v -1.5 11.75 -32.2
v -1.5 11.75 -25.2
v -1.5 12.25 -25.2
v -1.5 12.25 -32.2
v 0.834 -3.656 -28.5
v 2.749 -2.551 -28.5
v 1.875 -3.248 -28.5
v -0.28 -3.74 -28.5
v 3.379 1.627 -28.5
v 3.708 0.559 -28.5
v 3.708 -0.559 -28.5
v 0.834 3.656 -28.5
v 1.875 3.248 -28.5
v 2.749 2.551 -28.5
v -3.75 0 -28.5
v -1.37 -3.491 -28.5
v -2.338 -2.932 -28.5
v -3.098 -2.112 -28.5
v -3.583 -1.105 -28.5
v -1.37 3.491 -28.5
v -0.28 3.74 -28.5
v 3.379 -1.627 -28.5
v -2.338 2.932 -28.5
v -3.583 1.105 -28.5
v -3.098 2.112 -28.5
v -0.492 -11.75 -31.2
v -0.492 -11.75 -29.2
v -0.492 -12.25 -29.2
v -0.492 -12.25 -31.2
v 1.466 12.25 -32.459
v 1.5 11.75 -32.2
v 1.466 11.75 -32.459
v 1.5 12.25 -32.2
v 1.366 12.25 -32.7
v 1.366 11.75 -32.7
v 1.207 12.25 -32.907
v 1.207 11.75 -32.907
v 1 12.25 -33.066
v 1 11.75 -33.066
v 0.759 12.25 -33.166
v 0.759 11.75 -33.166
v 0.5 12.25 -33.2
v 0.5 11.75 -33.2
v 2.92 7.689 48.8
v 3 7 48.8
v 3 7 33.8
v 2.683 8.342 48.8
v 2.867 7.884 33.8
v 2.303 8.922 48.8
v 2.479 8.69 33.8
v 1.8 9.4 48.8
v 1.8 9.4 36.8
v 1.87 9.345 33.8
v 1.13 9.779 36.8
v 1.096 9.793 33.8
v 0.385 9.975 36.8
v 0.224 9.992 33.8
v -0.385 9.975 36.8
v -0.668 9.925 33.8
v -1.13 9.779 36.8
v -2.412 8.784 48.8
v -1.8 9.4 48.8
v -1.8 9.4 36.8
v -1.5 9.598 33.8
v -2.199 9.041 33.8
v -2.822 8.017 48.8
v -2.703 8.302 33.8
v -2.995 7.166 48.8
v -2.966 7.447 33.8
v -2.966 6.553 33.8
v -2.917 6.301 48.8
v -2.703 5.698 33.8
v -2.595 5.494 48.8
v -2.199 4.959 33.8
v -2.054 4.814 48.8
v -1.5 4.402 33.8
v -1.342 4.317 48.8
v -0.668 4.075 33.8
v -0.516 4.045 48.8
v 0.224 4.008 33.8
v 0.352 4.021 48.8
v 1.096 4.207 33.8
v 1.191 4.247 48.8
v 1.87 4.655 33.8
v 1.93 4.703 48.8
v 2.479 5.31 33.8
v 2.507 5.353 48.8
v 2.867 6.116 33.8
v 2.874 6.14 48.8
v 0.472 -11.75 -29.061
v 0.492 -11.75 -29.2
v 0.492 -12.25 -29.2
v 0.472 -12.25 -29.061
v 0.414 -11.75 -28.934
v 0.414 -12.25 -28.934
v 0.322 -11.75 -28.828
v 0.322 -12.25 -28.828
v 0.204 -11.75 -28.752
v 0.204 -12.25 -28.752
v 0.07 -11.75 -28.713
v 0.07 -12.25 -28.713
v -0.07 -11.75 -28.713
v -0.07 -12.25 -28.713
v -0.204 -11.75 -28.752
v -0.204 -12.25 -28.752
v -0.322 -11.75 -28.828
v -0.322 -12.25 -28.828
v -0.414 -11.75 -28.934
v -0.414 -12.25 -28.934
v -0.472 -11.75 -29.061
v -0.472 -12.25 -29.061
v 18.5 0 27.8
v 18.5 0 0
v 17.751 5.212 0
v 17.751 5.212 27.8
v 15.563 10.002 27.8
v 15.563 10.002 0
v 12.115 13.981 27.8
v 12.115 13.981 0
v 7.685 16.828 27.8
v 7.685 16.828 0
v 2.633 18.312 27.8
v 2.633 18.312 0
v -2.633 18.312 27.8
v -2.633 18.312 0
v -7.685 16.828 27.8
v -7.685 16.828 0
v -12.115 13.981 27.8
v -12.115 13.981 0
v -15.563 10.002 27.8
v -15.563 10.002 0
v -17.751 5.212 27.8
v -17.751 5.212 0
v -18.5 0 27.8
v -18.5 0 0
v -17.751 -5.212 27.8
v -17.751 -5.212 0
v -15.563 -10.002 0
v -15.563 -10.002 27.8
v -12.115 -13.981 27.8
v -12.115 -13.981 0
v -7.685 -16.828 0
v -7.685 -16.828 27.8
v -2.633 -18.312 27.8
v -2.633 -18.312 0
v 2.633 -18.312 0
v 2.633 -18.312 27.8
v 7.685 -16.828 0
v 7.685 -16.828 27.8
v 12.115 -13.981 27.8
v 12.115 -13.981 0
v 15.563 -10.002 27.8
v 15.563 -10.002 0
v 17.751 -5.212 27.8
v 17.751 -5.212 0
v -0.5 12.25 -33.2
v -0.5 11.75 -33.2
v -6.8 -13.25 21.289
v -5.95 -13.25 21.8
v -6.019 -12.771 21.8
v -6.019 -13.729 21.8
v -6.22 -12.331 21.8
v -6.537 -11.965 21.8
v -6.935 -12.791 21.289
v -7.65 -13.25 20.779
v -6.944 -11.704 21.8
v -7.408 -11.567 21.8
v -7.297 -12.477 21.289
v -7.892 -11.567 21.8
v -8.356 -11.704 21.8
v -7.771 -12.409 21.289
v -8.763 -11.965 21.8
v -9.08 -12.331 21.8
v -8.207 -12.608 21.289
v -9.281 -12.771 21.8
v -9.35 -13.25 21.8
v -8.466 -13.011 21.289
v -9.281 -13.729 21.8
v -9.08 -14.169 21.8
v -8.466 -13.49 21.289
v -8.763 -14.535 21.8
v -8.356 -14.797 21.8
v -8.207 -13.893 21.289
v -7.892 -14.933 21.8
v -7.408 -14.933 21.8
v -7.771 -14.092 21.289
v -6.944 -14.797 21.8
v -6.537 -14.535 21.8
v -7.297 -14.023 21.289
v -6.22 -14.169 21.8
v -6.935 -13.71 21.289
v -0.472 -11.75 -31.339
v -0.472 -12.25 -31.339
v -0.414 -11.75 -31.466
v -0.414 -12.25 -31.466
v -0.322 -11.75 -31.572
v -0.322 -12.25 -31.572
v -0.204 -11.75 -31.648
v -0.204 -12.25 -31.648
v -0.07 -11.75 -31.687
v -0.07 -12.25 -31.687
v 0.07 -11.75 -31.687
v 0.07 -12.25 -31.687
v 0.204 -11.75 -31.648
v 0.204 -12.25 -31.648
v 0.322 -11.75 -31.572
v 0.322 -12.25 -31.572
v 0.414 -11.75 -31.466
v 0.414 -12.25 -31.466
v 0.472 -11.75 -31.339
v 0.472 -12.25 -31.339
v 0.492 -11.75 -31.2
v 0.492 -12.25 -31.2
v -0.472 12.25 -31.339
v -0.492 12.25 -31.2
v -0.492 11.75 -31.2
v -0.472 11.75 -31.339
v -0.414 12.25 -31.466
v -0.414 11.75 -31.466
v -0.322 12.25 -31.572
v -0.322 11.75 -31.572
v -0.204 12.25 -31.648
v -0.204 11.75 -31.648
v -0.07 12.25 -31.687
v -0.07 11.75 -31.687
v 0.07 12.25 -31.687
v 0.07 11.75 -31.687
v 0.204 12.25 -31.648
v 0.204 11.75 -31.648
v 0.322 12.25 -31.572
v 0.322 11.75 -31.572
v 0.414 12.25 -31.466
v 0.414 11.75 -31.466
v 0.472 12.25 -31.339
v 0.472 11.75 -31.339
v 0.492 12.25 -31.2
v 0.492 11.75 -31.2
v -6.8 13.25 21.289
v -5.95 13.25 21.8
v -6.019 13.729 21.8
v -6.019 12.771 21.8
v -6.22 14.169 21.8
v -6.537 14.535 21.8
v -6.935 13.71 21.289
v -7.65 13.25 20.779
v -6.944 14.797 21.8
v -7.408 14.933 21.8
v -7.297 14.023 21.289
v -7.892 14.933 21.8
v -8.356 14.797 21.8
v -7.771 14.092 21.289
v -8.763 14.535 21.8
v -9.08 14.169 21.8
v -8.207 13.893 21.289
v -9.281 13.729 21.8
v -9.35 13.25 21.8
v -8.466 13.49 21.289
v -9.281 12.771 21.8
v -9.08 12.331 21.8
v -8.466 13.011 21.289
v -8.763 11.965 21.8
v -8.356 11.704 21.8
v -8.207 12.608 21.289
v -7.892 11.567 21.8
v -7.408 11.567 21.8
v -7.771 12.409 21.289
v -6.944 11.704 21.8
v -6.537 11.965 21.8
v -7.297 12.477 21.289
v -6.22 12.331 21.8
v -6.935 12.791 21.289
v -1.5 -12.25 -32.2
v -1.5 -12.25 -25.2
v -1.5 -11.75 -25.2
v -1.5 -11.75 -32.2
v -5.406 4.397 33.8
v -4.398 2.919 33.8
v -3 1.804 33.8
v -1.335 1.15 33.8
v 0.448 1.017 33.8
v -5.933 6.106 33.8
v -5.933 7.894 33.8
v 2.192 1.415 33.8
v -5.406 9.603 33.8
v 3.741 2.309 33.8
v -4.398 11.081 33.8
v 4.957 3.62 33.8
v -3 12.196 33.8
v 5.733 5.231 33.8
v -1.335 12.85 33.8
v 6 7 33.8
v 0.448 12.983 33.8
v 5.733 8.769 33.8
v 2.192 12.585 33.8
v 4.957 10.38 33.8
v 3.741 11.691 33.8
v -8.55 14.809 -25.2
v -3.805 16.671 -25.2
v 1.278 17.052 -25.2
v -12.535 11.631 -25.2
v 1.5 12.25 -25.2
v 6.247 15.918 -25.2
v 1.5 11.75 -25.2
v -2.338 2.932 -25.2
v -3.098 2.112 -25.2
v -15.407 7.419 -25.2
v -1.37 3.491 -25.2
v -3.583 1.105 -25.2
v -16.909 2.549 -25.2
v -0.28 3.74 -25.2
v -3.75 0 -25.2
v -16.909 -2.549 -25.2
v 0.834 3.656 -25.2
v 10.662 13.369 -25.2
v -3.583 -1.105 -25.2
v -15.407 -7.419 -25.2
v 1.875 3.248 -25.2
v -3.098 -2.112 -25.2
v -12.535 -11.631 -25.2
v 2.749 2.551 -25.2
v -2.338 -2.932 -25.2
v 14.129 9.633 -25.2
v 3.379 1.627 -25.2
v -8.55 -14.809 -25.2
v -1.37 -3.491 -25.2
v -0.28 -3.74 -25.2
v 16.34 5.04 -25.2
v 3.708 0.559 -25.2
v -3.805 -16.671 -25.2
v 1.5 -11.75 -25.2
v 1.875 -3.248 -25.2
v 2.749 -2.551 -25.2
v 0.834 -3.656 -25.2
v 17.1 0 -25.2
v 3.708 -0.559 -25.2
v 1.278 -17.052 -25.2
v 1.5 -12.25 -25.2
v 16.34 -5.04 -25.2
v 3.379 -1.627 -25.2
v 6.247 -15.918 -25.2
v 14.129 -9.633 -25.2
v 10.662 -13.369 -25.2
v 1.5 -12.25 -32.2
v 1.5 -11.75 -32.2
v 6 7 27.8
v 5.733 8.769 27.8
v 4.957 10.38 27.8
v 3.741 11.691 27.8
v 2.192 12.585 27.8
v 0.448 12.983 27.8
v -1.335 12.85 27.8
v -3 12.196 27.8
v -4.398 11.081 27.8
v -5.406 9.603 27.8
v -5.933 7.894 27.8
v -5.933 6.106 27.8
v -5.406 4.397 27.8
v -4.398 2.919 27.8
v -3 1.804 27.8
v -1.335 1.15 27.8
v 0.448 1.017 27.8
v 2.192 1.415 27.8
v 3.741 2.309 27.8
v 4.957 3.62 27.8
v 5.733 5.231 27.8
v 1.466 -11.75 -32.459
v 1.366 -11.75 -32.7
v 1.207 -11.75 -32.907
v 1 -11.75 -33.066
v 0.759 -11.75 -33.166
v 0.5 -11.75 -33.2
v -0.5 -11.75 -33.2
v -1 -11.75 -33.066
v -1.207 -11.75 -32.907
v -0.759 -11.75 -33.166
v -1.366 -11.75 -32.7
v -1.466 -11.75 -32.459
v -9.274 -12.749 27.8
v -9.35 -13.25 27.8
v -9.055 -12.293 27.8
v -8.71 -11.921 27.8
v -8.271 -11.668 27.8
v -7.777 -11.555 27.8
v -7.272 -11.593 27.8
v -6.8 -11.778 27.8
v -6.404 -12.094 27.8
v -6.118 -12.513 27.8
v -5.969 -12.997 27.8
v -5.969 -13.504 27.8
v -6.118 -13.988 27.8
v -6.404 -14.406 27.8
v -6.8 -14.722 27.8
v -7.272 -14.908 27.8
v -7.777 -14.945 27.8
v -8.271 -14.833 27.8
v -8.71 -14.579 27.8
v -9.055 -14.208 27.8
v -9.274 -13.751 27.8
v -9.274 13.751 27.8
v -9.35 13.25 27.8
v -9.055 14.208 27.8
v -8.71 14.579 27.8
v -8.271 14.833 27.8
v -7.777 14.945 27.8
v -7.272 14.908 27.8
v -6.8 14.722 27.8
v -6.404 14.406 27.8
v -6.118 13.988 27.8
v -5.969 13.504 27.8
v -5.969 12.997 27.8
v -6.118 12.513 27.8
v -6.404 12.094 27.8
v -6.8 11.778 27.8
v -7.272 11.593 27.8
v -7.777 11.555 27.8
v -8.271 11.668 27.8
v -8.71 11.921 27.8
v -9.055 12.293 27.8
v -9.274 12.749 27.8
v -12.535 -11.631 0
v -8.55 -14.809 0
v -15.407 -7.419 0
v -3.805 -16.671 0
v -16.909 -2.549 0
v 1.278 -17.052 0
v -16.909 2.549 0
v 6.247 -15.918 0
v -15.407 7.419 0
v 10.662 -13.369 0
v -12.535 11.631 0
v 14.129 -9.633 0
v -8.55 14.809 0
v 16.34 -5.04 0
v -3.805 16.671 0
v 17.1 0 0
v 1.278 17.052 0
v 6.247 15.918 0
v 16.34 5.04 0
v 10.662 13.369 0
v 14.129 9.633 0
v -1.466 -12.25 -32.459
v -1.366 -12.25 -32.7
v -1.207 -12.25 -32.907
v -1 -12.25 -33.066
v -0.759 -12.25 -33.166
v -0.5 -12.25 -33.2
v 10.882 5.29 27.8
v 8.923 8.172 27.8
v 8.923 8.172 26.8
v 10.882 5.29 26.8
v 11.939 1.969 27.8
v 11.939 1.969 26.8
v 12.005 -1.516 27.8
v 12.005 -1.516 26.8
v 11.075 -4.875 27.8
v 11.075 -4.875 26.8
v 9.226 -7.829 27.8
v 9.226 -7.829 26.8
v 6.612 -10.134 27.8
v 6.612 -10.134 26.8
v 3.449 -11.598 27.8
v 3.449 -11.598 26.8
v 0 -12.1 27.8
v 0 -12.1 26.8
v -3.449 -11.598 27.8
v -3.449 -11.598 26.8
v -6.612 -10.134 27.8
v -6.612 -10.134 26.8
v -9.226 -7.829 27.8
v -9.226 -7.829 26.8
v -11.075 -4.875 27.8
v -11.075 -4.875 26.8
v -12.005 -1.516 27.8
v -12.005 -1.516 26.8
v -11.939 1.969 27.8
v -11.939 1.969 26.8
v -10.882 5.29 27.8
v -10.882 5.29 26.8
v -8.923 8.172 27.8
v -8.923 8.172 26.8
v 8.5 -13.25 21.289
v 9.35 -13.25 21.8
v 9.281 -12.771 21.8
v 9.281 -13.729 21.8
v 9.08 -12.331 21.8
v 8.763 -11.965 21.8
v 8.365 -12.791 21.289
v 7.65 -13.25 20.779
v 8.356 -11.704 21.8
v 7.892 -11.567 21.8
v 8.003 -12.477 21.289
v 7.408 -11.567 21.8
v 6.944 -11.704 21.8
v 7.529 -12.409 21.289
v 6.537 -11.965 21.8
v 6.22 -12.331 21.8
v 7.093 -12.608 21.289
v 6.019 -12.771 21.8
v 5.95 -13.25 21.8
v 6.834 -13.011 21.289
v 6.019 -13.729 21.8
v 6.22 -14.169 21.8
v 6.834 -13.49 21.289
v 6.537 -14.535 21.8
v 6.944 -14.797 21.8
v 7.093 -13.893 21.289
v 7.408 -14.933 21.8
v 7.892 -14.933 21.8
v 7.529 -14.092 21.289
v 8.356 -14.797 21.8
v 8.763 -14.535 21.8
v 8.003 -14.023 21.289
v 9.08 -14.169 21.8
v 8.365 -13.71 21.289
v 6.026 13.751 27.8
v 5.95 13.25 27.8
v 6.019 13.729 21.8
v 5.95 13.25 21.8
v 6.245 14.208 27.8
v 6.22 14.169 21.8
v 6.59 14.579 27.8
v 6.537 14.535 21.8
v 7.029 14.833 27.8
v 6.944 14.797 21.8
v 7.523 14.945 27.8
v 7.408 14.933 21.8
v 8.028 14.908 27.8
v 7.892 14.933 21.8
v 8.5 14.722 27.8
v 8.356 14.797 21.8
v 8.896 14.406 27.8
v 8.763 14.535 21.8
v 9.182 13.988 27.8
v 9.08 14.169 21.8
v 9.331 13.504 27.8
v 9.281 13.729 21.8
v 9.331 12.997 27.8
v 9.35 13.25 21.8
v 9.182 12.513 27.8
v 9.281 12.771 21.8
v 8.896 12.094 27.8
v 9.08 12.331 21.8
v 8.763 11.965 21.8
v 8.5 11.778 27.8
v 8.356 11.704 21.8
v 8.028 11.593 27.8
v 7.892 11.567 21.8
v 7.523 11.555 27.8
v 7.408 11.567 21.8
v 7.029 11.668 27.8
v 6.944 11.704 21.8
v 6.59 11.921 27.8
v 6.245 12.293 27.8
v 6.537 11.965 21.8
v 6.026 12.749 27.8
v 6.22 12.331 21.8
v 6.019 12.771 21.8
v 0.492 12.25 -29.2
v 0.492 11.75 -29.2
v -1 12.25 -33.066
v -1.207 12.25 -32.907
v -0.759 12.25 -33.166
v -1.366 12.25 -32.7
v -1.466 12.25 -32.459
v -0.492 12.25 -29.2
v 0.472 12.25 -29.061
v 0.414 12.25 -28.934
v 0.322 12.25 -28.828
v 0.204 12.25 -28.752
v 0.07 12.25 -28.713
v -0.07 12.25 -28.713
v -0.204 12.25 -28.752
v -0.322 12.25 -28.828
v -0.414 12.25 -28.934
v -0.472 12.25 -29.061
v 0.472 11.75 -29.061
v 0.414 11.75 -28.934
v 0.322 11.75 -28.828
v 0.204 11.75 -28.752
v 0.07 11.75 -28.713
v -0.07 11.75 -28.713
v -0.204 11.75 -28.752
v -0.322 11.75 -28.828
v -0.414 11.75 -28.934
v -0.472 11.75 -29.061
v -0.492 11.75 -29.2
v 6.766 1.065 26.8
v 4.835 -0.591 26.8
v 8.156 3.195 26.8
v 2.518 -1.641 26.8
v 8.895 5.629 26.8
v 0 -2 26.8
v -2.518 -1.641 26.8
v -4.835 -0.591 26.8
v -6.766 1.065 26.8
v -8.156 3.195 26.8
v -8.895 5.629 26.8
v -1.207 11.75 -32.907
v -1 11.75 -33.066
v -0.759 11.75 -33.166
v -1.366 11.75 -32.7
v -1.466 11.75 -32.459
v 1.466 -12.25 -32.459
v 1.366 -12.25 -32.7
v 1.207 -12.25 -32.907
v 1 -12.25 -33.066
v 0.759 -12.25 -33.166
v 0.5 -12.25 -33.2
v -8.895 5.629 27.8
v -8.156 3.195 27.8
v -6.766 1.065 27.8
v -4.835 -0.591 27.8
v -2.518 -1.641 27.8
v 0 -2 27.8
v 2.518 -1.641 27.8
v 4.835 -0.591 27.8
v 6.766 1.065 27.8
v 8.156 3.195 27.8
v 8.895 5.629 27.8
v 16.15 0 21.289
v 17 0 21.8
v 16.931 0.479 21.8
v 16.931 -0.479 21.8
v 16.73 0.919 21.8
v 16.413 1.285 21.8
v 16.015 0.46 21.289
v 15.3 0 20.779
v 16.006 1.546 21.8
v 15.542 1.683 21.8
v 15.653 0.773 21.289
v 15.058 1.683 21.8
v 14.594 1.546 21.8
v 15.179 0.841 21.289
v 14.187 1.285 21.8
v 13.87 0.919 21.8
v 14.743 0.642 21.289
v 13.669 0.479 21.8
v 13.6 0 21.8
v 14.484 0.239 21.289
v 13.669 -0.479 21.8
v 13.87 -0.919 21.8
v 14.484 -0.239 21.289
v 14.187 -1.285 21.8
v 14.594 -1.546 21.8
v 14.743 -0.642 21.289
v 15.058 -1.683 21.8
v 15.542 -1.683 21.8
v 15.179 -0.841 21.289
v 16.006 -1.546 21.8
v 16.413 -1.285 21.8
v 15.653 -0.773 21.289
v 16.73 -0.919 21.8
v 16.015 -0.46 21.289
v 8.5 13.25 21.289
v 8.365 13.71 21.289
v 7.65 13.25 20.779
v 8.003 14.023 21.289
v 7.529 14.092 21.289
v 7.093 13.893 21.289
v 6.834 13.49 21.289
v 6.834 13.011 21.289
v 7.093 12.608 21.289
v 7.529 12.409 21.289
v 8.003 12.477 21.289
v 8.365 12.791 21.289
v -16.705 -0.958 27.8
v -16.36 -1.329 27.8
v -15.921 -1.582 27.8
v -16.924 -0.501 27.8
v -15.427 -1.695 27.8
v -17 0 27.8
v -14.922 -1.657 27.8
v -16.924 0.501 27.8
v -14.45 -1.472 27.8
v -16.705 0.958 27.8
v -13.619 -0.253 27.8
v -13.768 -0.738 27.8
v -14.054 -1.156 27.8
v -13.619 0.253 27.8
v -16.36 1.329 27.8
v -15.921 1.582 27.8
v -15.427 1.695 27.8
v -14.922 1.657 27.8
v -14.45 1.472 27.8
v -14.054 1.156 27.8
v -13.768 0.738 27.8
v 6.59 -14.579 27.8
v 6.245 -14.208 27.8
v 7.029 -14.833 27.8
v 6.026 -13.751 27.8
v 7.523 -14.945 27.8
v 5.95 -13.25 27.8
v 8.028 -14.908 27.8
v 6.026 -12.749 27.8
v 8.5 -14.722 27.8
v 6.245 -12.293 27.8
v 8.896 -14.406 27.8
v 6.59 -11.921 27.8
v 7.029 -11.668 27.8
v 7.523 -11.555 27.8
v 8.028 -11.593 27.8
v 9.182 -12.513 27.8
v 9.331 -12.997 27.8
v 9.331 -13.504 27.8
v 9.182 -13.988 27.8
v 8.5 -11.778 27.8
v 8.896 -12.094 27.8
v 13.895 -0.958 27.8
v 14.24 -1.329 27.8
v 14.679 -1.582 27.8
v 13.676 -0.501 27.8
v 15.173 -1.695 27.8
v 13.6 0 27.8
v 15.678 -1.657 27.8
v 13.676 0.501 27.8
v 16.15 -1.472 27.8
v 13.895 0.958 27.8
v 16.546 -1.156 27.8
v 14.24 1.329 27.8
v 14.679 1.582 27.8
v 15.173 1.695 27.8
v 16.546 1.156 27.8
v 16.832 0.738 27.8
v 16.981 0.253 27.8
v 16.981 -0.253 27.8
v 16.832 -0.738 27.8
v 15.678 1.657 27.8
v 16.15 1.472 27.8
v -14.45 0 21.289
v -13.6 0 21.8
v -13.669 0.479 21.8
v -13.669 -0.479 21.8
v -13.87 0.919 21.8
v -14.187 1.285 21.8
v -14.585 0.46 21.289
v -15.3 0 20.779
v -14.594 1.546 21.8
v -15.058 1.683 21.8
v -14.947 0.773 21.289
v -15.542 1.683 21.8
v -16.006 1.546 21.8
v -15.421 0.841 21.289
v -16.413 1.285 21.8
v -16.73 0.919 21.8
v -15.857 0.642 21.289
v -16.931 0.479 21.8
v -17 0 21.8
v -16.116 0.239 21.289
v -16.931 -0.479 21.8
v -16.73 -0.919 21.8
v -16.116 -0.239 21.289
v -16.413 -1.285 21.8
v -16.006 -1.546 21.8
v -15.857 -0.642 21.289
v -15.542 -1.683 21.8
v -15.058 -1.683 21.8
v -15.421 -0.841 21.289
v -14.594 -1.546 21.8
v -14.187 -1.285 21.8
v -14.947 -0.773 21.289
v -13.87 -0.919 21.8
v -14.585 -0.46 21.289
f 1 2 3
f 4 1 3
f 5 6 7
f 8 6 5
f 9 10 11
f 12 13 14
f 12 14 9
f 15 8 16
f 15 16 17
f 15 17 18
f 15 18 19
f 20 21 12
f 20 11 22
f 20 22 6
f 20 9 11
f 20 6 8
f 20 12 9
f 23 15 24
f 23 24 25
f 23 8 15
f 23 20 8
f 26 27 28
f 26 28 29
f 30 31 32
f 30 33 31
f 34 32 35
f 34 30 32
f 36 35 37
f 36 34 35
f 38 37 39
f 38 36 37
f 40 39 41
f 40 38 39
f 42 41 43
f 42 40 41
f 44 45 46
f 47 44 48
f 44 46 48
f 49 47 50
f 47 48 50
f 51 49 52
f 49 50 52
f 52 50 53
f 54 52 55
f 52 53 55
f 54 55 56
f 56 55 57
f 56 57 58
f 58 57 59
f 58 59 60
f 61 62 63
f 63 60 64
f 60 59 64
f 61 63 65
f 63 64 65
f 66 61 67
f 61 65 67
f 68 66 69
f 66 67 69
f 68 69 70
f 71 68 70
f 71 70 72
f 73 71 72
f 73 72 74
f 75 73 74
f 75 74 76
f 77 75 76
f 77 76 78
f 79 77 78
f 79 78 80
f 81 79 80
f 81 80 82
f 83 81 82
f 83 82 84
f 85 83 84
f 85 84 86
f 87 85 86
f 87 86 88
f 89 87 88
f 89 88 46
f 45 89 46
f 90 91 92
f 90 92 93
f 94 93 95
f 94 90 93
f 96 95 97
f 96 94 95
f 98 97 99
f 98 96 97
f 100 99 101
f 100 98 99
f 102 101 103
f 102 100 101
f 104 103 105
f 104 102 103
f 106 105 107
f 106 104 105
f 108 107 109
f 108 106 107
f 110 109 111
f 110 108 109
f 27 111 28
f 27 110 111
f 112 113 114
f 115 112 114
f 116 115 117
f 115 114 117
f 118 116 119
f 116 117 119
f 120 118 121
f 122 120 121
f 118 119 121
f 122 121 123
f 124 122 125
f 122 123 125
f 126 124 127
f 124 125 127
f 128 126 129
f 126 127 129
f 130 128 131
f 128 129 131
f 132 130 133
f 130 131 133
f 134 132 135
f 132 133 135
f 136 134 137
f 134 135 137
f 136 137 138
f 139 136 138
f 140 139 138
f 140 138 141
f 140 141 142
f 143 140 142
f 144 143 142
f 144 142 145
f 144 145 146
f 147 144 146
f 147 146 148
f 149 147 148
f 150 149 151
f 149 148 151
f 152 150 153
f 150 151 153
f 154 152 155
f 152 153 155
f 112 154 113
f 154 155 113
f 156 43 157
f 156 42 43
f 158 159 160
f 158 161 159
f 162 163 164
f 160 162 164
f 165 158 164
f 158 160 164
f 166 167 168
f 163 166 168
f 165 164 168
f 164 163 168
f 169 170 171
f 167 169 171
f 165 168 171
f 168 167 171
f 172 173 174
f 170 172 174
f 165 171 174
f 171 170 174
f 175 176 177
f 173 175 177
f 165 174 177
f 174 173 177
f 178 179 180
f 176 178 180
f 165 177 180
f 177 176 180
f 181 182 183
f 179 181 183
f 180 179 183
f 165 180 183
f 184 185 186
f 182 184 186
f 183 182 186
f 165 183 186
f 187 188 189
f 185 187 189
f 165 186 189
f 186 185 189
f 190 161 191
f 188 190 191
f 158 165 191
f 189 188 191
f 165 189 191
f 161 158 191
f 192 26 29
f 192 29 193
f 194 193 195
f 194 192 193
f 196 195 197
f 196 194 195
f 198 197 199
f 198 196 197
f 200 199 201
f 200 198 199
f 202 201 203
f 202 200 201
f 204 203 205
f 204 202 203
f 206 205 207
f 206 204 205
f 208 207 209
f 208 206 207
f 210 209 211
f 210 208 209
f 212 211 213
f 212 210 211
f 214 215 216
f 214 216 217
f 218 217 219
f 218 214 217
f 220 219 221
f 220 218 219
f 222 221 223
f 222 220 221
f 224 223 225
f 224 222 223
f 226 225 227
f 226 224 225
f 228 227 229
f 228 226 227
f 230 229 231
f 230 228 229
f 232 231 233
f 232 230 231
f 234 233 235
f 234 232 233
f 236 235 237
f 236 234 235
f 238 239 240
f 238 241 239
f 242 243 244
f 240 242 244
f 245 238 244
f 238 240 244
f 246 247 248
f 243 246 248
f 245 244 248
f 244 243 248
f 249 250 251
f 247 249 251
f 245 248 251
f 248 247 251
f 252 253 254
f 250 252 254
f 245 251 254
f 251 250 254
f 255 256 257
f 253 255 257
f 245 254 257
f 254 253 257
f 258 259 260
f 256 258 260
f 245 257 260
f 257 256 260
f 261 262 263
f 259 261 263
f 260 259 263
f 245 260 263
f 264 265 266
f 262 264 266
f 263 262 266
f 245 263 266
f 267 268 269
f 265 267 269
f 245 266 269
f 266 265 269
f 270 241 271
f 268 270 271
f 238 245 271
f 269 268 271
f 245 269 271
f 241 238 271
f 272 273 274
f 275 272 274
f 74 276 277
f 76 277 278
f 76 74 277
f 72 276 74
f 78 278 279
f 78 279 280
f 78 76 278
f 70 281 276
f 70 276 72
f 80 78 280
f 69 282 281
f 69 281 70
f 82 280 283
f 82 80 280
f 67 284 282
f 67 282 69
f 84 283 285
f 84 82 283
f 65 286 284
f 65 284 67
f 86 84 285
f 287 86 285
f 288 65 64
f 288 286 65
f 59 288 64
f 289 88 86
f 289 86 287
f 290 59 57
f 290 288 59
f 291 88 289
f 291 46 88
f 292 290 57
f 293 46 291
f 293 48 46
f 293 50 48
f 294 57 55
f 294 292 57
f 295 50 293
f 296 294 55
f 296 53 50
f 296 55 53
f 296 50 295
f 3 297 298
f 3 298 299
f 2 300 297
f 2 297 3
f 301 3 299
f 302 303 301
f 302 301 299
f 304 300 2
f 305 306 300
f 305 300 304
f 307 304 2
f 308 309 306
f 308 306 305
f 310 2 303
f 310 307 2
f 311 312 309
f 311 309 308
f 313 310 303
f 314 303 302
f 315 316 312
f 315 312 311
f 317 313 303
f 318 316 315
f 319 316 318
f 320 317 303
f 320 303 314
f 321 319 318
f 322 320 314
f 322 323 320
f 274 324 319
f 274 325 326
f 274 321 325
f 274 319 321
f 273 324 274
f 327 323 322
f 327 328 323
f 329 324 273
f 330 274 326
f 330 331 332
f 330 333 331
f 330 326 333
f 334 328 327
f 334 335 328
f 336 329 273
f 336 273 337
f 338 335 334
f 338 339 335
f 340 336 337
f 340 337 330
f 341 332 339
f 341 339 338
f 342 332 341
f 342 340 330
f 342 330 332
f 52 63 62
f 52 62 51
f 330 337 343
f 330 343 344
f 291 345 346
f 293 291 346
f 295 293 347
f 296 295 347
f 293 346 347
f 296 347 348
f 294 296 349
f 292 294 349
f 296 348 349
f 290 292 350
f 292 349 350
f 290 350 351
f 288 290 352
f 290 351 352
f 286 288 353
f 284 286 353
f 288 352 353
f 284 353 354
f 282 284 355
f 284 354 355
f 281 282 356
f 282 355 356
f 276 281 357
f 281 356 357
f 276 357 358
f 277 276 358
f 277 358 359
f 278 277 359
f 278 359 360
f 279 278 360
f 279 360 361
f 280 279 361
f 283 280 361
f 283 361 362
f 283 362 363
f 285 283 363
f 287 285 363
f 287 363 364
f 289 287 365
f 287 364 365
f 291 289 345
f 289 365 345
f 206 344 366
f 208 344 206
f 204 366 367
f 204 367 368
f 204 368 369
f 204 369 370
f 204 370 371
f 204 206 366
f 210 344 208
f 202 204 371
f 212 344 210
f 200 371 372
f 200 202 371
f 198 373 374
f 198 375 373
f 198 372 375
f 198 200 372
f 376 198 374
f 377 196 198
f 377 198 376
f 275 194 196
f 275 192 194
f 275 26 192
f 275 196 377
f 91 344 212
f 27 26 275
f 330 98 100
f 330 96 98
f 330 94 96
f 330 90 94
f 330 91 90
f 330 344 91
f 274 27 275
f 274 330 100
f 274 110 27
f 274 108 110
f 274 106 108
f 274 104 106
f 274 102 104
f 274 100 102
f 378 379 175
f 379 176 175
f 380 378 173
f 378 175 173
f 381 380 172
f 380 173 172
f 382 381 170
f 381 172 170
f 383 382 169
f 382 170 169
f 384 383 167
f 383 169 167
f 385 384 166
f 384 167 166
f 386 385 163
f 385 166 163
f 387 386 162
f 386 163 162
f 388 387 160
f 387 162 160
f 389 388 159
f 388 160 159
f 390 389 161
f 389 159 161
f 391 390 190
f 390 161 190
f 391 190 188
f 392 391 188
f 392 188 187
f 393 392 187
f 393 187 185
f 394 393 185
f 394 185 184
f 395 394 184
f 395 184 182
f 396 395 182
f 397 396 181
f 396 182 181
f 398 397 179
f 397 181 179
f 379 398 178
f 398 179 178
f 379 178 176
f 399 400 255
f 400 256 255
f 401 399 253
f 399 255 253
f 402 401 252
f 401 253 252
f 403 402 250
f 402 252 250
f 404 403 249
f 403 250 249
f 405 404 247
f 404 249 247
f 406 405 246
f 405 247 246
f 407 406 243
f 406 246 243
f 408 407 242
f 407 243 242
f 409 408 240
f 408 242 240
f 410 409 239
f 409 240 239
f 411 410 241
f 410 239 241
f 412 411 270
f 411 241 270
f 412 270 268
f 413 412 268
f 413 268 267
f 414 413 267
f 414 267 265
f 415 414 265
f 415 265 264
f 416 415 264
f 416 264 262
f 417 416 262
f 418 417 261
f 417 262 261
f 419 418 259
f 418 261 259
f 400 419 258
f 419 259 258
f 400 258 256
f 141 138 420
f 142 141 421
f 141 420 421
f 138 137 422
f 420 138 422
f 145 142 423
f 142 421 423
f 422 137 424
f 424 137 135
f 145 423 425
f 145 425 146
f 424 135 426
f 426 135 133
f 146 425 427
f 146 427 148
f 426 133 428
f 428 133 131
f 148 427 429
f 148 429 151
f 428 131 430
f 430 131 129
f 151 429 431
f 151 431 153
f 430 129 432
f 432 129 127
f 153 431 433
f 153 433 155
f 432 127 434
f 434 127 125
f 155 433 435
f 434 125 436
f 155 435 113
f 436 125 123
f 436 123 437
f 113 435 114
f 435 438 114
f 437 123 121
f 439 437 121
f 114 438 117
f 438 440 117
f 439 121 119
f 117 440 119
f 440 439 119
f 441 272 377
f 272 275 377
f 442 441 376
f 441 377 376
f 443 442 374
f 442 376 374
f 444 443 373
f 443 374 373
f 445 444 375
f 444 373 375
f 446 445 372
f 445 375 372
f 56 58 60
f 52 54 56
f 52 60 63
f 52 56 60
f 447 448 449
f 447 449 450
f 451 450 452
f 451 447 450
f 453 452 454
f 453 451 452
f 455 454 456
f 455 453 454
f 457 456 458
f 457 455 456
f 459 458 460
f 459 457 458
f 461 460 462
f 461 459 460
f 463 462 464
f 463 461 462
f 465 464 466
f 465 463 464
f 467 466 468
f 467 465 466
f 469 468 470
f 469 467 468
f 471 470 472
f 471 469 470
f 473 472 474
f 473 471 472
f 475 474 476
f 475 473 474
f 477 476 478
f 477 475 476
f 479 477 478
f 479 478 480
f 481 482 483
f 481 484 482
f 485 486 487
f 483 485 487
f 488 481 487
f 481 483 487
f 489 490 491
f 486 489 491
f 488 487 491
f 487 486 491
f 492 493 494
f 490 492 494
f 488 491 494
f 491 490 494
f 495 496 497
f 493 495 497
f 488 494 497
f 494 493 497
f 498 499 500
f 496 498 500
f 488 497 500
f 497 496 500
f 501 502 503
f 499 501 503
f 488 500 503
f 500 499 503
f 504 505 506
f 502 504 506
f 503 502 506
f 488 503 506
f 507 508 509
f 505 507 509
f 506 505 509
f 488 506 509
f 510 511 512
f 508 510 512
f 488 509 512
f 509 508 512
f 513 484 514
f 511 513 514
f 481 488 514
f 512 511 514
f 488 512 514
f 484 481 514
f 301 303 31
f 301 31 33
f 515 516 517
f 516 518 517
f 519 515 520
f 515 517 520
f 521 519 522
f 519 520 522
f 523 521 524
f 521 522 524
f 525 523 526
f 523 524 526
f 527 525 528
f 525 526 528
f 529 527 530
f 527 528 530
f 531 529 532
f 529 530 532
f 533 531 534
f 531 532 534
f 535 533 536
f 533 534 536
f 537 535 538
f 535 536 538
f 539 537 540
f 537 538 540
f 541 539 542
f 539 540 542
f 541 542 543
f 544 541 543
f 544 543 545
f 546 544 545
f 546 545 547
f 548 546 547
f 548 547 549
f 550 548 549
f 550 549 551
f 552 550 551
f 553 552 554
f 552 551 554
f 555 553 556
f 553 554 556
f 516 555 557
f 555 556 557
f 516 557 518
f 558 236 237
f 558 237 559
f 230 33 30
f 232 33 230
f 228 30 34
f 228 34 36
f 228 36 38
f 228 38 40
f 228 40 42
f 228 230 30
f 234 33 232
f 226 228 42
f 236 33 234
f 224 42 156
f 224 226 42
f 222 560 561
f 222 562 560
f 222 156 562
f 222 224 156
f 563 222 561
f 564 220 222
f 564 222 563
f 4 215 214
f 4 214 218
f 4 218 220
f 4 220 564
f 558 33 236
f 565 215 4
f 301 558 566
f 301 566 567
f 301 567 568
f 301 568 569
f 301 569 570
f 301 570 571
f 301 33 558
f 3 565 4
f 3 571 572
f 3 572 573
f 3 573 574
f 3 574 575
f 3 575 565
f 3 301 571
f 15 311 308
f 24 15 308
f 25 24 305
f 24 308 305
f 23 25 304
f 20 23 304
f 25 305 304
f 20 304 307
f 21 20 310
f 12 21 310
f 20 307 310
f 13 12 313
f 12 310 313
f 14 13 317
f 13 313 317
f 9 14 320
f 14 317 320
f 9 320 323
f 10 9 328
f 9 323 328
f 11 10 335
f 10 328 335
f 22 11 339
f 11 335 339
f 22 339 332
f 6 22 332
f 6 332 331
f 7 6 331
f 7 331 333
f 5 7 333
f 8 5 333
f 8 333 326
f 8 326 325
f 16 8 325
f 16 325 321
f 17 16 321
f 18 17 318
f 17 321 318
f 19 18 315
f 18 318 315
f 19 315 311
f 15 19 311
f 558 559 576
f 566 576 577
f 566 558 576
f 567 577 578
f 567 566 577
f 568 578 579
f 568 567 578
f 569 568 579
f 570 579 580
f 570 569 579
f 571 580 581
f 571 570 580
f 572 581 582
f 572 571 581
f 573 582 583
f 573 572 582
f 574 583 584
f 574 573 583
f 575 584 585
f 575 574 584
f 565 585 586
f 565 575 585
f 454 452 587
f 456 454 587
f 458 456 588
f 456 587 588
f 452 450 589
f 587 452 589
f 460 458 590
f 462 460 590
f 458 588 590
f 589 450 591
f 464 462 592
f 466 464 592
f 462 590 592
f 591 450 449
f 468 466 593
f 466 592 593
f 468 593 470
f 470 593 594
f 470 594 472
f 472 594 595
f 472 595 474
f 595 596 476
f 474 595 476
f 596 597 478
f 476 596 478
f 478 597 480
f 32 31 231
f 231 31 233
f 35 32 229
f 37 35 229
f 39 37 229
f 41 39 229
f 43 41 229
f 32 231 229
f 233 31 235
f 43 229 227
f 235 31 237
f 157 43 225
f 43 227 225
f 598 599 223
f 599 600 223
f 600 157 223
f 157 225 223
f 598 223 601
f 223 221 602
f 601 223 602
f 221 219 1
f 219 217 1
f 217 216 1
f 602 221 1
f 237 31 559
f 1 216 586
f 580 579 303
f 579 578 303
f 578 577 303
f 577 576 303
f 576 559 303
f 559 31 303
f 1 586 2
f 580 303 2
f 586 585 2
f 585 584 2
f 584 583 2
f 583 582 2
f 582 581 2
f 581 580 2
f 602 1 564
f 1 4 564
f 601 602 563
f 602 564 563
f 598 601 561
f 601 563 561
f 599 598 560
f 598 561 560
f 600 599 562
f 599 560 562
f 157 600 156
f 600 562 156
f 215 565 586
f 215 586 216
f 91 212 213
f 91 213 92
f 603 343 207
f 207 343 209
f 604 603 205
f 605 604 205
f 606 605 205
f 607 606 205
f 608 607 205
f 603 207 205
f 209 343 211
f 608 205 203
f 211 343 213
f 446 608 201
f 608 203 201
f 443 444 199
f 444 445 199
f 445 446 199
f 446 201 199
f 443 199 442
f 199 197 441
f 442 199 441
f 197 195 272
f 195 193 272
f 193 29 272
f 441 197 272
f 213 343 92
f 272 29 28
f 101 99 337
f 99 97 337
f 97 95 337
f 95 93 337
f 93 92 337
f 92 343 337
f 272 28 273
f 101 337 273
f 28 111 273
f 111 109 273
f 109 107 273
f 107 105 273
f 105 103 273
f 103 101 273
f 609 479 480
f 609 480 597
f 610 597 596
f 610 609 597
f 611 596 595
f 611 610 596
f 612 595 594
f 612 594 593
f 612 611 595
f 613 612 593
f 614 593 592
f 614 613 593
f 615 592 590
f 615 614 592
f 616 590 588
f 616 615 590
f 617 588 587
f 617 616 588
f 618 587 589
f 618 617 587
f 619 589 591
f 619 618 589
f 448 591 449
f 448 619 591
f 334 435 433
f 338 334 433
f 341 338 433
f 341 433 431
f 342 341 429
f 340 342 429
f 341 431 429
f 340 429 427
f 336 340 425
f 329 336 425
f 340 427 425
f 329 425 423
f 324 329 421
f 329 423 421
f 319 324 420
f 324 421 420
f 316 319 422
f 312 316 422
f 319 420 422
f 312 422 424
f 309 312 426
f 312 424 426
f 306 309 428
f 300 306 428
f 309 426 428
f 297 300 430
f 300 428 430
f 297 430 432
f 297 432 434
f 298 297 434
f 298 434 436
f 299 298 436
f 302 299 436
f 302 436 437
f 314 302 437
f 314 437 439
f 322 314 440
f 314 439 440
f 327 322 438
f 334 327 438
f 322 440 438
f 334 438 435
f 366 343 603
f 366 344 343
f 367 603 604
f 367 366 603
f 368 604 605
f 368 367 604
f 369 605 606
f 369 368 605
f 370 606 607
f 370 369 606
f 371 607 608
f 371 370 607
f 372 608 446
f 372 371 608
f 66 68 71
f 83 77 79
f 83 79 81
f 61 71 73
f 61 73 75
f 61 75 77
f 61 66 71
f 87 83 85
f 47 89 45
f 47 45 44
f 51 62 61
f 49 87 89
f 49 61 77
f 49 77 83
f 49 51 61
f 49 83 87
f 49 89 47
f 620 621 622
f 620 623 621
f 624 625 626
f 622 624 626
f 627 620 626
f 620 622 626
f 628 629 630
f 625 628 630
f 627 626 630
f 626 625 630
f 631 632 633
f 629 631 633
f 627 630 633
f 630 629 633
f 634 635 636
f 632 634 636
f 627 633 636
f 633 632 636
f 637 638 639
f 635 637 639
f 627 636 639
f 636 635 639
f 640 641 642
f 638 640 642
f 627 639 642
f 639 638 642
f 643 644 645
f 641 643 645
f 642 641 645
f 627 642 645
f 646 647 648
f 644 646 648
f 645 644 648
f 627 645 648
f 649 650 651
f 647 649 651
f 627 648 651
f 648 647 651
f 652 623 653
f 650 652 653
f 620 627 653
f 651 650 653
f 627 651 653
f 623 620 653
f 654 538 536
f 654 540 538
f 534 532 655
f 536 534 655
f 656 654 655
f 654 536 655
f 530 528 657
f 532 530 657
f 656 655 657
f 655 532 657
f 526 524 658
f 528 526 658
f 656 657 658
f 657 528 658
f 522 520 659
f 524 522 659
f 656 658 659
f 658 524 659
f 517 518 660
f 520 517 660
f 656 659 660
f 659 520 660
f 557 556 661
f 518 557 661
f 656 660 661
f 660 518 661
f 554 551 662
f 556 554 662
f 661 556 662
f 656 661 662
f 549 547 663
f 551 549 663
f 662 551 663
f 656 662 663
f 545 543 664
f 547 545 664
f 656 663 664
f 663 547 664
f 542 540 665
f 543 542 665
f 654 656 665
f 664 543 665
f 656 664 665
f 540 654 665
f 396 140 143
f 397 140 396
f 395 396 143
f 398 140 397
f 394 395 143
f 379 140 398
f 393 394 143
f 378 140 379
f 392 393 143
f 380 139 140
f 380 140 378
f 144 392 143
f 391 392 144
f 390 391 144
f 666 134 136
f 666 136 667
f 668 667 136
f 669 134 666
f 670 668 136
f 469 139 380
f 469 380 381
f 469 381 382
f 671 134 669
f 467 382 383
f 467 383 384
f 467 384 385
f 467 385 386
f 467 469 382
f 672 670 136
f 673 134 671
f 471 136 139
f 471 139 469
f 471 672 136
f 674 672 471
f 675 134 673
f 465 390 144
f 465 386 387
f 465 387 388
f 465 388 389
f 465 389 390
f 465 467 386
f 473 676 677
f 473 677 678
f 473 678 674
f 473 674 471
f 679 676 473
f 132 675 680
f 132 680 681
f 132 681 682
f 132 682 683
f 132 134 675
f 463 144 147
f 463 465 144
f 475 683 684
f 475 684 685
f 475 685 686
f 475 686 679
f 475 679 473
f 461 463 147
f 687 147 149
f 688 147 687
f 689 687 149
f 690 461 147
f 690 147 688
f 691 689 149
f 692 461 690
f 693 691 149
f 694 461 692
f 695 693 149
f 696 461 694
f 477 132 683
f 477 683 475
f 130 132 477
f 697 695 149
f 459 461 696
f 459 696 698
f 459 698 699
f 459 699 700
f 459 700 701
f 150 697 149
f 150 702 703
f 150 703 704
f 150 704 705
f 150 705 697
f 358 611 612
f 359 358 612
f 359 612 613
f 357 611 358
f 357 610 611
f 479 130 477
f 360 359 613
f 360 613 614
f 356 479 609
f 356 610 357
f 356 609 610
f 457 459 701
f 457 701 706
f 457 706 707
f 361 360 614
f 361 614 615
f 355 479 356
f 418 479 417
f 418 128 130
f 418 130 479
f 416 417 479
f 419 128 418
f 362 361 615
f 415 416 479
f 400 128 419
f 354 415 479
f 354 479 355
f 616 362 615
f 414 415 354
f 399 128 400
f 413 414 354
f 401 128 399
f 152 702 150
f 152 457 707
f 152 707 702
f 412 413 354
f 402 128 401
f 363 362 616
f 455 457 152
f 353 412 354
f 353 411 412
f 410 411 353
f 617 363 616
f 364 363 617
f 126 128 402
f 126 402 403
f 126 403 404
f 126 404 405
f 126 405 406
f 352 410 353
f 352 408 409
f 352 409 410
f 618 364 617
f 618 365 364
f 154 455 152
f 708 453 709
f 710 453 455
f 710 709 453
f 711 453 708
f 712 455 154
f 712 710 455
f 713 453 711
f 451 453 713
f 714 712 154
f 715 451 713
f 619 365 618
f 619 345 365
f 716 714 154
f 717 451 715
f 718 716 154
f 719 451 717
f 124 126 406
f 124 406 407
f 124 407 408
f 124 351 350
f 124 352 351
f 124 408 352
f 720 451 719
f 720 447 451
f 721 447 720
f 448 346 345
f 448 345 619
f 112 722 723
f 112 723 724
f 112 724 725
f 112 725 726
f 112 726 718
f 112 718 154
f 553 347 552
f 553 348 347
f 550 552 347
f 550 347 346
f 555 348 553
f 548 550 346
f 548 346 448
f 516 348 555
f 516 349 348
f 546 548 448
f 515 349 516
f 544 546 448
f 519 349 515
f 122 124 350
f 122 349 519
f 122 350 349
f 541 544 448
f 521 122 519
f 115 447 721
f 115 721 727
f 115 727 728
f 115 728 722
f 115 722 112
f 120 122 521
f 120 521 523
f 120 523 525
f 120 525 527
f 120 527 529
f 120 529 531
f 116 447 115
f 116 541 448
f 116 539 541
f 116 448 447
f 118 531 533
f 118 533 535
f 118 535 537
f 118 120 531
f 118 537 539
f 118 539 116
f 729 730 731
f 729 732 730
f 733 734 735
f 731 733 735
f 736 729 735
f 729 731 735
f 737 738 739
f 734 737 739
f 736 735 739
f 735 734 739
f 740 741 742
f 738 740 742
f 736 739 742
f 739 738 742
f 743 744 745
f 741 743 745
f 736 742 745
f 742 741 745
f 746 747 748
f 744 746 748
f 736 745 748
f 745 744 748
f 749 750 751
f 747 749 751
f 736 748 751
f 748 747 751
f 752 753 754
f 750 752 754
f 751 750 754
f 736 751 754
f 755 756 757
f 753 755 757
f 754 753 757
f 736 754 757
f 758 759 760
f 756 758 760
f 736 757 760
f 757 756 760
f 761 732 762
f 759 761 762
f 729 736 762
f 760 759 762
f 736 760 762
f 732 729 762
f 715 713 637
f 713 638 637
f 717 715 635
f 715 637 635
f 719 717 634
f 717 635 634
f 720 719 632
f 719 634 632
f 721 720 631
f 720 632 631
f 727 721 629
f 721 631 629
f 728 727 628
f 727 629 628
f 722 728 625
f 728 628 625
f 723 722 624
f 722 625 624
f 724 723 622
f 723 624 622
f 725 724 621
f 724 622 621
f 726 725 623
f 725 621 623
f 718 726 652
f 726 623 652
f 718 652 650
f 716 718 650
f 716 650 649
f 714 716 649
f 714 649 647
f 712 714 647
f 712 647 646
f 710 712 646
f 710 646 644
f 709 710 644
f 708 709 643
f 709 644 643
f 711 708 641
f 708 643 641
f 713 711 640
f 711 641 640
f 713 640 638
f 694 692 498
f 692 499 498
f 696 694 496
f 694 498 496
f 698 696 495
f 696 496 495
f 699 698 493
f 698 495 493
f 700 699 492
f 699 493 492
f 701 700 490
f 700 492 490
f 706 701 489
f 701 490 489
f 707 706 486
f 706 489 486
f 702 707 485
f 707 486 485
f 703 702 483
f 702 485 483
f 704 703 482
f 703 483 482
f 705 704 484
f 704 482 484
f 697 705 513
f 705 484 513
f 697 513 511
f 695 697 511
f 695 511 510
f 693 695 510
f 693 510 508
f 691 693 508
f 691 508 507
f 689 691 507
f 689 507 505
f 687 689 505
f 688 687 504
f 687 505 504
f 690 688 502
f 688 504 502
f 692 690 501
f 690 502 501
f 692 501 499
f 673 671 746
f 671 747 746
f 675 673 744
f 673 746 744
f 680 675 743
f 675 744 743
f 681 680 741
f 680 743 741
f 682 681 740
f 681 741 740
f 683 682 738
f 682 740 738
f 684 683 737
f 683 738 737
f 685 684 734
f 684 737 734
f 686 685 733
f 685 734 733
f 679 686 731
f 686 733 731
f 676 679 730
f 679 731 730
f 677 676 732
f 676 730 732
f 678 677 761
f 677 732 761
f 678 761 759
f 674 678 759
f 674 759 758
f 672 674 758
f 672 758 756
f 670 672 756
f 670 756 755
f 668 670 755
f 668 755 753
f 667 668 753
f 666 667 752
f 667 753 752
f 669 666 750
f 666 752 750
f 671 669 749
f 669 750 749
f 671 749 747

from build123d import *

# Parameters (mm, degrees)
SKETCH1_R                = 18.5
BOSS_EXTRUDE1_DEPTH      = 27.8
SKETCH2_R                = 17.1
BOSS_EXTRUDE2_DEPTH      = 25.2
SKETCH3_R                = 3.75
BOSS_EXTRUDE3_DEPTH      = 3.3
SKETCH4_R                = 6
BOSS_EXTRUDE4_DEPTH      = 6
SKETCH5_R                = 3
BOSS_EXTRUDE6_DEPTH      = 15
CUT_EXTRUDE1_START       = -12
CUT_EXTRUDE1_DEPTH       = 12
CUT_EXTRUDE2_DEPTH       = 1
M3_CLEARANCE_HOLE1_D     = 3.4
M3_CLEARANCE_HOLE1_DEPTH = 6
M3_CLEARANCE_HOLE1_TIP   = 1.021463052
SKETCH11_W               = 3
SKETCH11_H               = 0.5
BOSS_EXTRUDE7_DEPTH      = 8
FILLET1_R                = 1
CUT_EXTRUDE3_DEPTH       = 28


with BuildPart() as part:
    # Sketch1 → Boss-Extrude1 (new body)
    with BuildSketch(Plane.XY):
        Circle(SKETCH1_R)
    extrude(amount=BOSS_EXTRUDE1_DEPTH)

    # Sketch2 → Boss-Extrude2 (add)
    with BuildSketch(Plane(origin=(0, 0, 0), x_dir=(-1, 0, 0), z_dir=(0, 0, -1))):
        with Locations(Location((0, 0, 0), (0, 0, 180))):
            Circle(SKETCH2_R)
    extrude(amount=BOSS_EXTRUDE2_DEPTH)

    # Sketch3 → Boss-Extrude3 (add)
    with BuildSketch(Plane(origin=(0, 0, -25.2), x_dir=(-1, 0, 0), z_dir=(0, 0, -1))):
        Circle(SKETCH3_R)
    extrude(amount=BOSS_EXTRUDE3_DEPTH)

    # Sketch4 → Boss-Extrude4 (add)
    with BuildSketch(Plane.XY.offset(27.8)):
        with Locations((0, 7)):
            Circle(SKETCH4_R)
    extrude(amount=BOSS_EXTRUDE4_DEPTH)

    # Sketch5 → Boss-Extrude6 (add)
    with BuildSketch(Plane.XY.offset(33.8)):
        with Locations((0, 7)):
            Circle(SKETCH5_R)
    extrude(amount=BOSS_EXTRUDE6_DEPTH)

    # Sketch7 → Cut-Extrude1 (cut)
    with BuildSketch(Plane.XY.offset(48.8).offset(CUT_EXTRUDE1_START)):
        with BuildLine():
            Line((-1.8, 9.4), (1.8, 9.4))
            ThreePointArc((1.8, 9.4), (0, 10), (-1.8, 9.4))
        make_face()
    extrude(amount=CUT_EXTRUDE1_DEPTH, mode=Mode.SUBTRACT)

    # Sketch8 → Cut-Extrude2 (cut)
    with BuildSketch(Plane.XY.offset(27.8)):
        with BuildLine():
            ThreePointArc((8.923344727, 8.172142857), (0, -12.1), (-8.923344727, 8.172142857))
            ThreePointArc((-8.923344727, 8.172142857), (0, -2), (8.923344727, 8.172142857))
        make_face()
    extrude(amount=-CUT_EXTRUDE2_DEPTH, mode=Mode.SUBTRACT)

    # M3 Clearance Hole1
    with Locations(Plane.XY.offset(27.8)):
        with Locations((7.65, -13.250188678), (-7.65, -13.250188678), (-15.3, 0), (-7.65, 13.250188678), (15.3, 0), (7.65, 13.250188678)):
            Hole(M3_CLEARANCE_HOLE1_D / 2, depth=M3_CLEARANCE_HOLE1_DEPTH)
            with Locations((0, 0, -(M3_CLEARANCE_HOLE1_DEPTH + M3_CLEARANCE_HOLE1_TIP / 2))):  # 118° drill point
                Cone(0, M3_CLEARANCE_HOLE1_D / 2, M3_CLEARANCE_HOLE1_TIP, mode=Mode.SUBTRACT)

    # Sketch11 → Boss-Extrude7 (add)
    with BuildSketch(Plane(origin=(0, 0, -25.2), x_dir=(-1, 0, 0), z_dir=(0, 0, -1))):
        with Locations((0, 12)):
            Rectangle(SKETCH11_W, SKETCH11_H)
        with Locations((0, -12)):
            Rectangle(SKETCH11_W, SKETCH11_H)
    extrude(amount=BOSS_EXTRUDE7_DEPTH)

    # Fillet1
    fillet1_edges = [part.edges().sort_by_distance(p)[0] for p in [
        (-1.5, 12, -33.2),
        (1.5, 12, -33.2),
        (-1.5, -12, -33.2),
        (1.5, -12, -33.2),
    ]]
    fillet(fillet1_edges, radius=FILLET1_R)

    # Sketch12 → Cut-Extrude3 (cut)
    with BuildSketch(Plane(origin=(0, 12.25, 0), x_dir=(1, 0, 0), z_dir=(0, 1, 0))):
        with BuildLine():
            Line((0.492088327, 31.2), (0.492088327, 29.2))
            ThreePointArc((0.492088327, 29.2), (0, 28.707911673), (-0.492088327, 29.2))
            Line((-0.492088327, 29.2), (-0.492088327, 31.2))
            ThreePointArc((-0.492088327, 31.2), (0, 31.692088327), (0.492088327, 31.2))
        make_face()
    extrude(amount=-CUT_EXTRUDE3_DEPTH, mode=Mode.SUBTRACT)


solid = part.part
